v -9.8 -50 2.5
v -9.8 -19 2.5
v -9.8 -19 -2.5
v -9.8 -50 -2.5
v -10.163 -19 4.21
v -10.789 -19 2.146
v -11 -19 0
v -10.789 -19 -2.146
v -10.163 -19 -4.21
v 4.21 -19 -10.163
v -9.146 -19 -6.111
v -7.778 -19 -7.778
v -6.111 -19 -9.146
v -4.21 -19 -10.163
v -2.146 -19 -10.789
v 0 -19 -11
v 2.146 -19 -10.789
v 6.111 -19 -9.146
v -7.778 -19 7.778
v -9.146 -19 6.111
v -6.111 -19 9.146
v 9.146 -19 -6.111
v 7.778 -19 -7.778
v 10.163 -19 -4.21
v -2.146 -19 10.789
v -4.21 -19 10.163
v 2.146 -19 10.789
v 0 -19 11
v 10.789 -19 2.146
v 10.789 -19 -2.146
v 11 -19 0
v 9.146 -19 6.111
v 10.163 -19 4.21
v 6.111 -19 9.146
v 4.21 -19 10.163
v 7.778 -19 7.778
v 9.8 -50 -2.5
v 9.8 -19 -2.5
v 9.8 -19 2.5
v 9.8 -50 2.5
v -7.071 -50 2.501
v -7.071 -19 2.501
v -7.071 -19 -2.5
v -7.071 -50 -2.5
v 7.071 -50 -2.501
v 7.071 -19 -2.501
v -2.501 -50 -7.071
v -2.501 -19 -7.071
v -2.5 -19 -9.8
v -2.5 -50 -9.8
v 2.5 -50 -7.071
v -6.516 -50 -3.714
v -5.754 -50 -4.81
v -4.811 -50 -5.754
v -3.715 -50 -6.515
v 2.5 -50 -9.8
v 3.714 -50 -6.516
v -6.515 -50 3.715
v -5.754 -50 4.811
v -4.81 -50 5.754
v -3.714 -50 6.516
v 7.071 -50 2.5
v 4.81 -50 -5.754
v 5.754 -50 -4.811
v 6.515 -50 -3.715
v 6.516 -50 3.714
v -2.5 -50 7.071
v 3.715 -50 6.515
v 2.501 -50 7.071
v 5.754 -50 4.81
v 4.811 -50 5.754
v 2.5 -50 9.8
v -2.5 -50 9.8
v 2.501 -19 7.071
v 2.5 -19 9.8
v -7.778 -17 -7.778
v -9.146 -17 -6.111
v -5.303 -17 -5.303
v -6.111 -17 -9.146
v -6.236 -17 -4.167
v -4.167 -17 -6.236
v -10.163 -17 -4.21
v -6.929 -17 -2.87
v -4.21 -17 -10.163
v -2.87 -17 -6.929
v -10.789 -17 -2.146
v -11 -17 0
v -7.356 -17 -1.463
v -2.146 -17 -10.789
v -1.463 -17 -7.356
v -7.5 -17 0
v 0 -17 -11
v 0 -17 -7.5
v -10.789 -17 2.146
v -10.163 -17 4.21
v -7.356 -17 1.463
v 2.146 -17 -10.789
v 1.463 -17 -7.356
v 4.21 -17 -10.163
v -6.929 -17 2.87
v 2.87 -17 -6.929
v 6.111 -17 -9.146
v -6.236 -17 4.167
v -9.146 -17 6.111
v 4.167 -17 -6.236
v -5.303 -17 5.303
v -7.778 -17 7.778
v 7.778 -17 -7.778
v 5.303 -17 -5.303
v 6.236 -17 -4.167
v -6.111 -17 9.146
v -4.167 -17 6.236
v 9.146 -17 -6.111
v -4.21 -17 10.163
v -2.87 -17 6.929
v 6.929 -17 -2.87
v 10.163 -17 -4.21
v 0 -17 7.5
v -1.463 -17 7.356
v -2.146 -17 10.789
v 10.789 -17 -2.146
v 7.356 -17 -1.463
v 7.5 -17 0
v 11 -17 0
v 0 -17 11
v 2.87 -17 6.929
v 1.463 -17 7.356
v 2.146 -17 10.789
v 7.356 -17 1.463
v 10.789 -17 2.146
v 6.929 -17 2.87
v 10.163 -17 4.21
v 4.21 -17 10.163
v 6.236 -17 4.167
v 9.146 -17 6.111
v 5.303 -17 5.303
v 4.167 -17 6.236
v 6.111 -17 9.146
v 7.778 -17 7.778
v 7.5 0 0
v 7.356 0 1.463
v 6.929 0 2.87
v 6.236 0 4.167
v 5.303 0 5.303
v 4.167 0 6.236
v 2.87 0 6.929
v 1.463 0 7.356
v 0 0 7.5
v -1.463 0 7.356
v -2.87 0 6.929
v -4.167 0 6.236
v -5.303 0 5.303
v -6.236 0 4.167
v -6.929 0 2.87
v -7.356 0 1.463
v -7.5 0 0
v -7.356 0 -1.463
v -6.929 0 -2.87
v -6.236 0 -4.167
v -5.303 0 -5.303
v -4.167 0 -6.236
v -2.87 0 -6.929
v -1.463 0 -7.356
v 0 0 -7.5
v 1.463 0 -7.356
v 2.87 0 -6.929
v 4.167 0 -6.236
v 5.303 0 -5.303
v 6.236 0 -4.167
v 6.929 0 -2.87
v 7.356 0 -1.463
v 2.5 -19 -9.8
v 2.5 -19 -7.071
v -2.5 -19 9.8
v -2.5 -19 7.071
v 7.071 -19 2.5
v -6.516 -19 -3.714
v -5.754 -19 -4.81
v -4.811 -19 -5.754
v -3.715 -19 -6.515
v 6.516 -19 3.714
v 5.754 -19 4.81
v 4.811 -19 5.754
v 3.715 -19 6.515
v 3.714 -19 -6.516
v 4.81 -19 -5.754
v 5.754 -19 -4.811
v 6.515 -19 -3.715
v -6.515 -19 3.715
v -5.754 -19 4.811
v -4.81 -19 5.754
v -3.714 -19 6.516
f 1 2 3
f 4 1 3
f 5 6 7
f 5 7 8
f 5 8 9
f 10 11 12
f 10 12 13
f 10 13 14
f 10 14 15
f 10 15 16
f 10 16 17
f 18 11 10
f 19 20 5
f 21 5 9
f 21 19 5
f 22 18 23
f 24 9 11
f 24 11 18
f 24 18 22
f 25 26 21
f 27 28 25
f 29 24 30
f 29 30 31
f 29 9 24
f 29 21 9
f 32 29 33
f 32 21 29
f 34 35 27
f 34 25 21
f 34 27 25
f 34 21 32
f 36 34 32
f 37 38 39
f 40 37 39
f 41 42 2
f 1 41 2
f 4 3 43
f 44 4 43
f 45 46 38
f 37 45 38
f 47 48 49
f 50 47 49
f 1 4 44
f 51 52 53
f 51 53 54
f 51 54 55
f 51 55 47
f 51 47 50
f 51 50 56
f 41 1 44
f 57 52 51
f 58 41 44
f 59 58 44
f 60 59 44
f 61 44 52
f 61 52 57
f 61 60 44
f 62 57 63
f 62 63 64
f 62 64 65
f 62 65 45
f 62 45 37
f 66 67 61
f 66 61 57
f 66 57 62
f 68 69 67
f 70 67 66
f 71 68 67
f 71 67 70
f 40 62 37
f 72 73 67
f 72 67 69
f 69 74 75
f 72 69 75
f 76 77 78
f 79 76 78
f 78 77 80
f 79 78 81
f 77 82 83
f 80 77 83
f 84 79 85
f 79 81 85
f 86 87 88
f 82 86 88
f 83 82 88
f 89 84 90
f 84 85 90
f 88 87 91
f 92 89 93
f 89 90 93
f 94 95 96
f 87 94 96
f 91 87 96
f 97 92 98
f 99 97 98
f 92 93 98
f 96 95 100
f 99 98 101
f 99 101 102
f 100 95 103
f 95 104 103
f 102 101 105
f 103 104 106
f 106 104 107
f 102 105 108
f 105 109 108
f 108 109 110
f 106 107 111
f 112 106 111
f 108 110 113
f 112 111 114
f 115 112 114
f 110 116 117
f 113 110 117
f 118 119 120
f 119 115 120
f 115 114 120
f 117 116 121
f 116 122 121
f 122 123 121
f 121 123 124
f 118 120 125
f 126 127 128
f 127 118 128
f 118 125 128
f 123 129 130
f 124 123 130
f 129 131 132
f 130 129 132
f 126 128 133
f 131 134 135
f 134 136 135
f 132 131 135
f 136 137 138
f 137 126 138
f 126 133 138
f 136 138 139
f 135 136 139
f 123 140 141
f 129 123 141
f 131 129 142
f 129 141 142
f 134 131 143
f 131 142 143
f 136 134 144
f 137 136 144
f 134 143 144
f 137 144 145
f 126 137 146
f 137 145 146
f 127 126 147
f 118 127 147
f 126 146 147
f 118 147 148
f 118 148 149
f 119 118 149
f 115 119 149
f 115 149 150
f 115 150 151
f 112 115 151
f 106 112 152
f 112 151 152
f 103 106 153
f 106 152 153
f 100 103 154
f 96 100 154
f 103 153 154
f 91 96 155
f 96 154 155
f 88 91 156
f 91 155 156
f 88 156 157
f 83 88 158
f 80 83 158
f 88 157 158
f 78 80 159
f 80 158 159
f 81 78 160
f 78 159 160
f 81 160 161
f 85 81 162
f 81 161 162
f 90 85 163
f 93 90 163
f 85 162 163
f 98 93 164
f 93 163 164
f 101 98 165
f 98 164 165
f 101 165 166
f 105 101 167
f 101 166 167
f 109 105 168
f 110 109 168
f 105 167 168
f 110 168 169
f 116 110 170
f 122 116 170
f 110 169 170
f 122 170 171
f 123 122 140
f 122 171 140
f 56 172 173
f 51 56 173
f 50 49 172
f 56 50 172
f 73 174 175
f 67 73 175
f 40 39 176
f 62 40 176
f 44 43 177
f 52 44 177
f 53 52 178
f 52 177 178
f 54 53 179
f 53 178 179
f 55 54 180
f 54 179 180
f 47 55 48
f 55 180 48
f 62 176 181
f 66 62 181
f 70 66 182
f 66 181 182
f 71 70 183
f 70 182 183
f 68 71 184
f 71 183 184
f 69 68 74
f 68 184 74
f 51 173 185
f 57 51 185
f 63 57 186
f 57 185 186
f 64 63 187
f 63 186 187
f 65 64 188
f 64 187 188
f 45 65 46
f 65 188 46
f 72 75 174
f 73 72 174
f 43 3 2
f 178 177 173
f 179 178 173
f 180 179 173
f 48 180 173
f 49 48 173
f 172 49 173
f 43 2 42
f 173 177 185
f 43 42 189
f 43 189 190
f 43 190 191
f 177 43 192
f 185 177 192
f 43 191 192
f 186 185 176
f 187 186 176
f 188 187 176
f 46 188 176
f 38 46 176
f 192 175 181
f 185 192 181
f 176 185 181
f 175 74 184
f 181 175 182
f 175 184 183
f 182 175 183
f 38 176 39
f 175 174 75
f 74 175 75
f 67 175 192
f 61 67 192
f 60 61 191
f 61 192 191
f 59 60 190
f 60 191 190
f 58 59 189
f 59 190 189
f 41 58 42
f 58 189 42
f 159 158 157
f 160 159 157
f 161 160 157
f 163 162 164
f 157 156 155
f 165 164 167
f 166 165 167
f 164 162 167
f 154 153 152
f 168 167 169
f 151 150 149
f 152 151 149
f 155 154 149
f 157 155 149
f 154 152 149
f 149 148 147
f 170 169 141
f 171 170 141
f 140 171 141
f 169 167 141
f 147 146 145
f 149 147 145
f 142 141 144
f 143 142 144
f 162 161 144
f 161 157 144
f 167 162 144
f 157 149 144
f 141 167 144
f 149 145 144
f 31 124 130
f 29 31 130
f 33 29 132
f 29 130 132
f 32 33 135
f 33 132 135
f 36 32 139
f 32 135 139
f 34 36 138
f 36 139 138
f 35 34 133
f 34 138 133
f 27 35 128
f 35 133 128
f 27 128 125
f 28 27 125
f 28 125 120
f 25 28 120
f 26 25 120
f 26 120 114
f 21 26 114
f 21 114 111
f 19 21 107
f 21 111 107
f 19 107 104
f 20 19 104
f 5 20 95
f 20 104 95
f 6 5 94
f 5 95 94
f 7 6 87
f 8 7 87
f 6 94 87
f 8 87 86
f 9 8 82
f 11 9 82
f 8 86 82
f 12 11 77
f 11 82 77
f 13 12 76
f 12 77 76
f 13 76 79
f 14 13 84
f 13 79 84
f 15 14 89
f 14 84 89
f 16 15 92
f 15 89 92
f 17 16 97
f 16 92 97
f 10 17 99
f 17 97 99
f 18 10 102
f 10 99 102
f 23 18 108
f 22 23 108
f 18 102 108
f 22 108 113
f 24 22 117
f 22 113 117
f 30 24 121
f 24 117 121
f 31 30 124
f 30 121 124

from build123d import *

# Parameters (mm, degrees)
F0_R     = 7.5
F1_DEPTH = 17
F2_R     = 11
F3_DEPTH = 2
F5_DEPTH = 31


with BuildPart() as f1:
    # F0 (on Front) → F1 (new body)
    with BuildSketch(Plane.XZ):
        Circle(F0_R)
    extrude(amount=F1_DEPTH)

    # F2 (on face) → F3 (join)
    with BuildSketch(Plane.XZ.offset(17)):
        Circle(F2_R)
    extrude(amount=F3_DEPTH)


with BuildPart() as f5:
    # F4 (on face) → F5 (new body)
    with BuildSketch(Plane.XZ.offset(19)):
        with BuildLine():
            ThreePointArc((7.070744, -2.500917), (7.391907, -1.268744), (7.5, 0))
            ThreePointArc((7.5, 0), (7.391989, 1.268265), (7.071068, 2.5))
            ThreePointArc((7.071068, 2.5), (5.303645, 5.302957), (2.500917, 7.070744))
            ThreePointArc((2.500917, 7.070744), (0.000486, 7.5), (-2.5, 7.071068))
            ThreePointArc((-2.5, 7.071068), (-5.302957, 5.303645), (-7.070744, 2.500917))
            ThreePointArc((-7.070744, 2.500917), (-7.5, 0.000486), (-7.071068, -2.5))
            ThreePointArc((-7.071068, -2.5), (-5.303645, -5.302957), (-2.500917, -7.070744))
            ThreePointArc((-2.500917, -7.070744), (-0.000486, -7.5), (2.5, -7.071068))
            ThreePointArc((2.5, -7.071068), (5.302957, -5.303645), (7.070744, -2.500917))
        make_face()
        with BuildLine():
            ThreePointArc((7.071068, 2.5), (7.391989, 1.268265), (7.5, 0))
            ThreePointArc((7.5, 0), (7.391907, -1.268744), (7.070744, -2.500917))
            Line((7.070744, -2.500917), (9.799744, -2.5))
            Line((9.799744, -2.5), (9.799744, 0))
            Line((9.799744, 0), (9.799744, 2.5))
            Line((9.799744, 2.5), (7.071068, 2.5))
        make_face()
        with BuildLine():
            ThreePointArc((-2.5, 7.071068), (0.000486, 7.5), (2.500917, 7.070744))
            Line((2.500917, 7.070744), (2.5, 9.799744))
            Line((2.5, 9.799744), (0, 9.799744))
            Line((0, 9.799744), (-2.5, 9.799744))
            Line((-2.5, 9.799744), (-2.5, 7.071068))
        make_face()
        with BuildLine():
            ThreePointArc((-7.071068, -2.5), (-7.5, 0.000486), (-7.070744, 2.500917))
            Line((-7.070744, 2.500917), (-9.799744, 2.5))
            Line((-9.799744, 2.5), (-9.799744, 0))
            Line((-9.799744, 0), (-9.799744, -2.5))
            Line((-9.799744, -2.5), (-7.071068, -2.5))
        make_face()
        with BuildLine():
            Line((2.5, -9.799744), (2.5, -7.071068))
            ThreePointArc((2.5, -7.071068), (-0.000486, -7.5), (-2.500917, -7.070744))
            Line((-2.500917, -7.070744), (-2.5, -9.799744))
            Line((-2.5, -9.799744), (0, -9.799744))
            Line((0, -9.799744), (2.5, -9.799744))
        make_face()
    extrude(amount=F5_DEPTH)


solid = Compound([f1.part, f5.part])
